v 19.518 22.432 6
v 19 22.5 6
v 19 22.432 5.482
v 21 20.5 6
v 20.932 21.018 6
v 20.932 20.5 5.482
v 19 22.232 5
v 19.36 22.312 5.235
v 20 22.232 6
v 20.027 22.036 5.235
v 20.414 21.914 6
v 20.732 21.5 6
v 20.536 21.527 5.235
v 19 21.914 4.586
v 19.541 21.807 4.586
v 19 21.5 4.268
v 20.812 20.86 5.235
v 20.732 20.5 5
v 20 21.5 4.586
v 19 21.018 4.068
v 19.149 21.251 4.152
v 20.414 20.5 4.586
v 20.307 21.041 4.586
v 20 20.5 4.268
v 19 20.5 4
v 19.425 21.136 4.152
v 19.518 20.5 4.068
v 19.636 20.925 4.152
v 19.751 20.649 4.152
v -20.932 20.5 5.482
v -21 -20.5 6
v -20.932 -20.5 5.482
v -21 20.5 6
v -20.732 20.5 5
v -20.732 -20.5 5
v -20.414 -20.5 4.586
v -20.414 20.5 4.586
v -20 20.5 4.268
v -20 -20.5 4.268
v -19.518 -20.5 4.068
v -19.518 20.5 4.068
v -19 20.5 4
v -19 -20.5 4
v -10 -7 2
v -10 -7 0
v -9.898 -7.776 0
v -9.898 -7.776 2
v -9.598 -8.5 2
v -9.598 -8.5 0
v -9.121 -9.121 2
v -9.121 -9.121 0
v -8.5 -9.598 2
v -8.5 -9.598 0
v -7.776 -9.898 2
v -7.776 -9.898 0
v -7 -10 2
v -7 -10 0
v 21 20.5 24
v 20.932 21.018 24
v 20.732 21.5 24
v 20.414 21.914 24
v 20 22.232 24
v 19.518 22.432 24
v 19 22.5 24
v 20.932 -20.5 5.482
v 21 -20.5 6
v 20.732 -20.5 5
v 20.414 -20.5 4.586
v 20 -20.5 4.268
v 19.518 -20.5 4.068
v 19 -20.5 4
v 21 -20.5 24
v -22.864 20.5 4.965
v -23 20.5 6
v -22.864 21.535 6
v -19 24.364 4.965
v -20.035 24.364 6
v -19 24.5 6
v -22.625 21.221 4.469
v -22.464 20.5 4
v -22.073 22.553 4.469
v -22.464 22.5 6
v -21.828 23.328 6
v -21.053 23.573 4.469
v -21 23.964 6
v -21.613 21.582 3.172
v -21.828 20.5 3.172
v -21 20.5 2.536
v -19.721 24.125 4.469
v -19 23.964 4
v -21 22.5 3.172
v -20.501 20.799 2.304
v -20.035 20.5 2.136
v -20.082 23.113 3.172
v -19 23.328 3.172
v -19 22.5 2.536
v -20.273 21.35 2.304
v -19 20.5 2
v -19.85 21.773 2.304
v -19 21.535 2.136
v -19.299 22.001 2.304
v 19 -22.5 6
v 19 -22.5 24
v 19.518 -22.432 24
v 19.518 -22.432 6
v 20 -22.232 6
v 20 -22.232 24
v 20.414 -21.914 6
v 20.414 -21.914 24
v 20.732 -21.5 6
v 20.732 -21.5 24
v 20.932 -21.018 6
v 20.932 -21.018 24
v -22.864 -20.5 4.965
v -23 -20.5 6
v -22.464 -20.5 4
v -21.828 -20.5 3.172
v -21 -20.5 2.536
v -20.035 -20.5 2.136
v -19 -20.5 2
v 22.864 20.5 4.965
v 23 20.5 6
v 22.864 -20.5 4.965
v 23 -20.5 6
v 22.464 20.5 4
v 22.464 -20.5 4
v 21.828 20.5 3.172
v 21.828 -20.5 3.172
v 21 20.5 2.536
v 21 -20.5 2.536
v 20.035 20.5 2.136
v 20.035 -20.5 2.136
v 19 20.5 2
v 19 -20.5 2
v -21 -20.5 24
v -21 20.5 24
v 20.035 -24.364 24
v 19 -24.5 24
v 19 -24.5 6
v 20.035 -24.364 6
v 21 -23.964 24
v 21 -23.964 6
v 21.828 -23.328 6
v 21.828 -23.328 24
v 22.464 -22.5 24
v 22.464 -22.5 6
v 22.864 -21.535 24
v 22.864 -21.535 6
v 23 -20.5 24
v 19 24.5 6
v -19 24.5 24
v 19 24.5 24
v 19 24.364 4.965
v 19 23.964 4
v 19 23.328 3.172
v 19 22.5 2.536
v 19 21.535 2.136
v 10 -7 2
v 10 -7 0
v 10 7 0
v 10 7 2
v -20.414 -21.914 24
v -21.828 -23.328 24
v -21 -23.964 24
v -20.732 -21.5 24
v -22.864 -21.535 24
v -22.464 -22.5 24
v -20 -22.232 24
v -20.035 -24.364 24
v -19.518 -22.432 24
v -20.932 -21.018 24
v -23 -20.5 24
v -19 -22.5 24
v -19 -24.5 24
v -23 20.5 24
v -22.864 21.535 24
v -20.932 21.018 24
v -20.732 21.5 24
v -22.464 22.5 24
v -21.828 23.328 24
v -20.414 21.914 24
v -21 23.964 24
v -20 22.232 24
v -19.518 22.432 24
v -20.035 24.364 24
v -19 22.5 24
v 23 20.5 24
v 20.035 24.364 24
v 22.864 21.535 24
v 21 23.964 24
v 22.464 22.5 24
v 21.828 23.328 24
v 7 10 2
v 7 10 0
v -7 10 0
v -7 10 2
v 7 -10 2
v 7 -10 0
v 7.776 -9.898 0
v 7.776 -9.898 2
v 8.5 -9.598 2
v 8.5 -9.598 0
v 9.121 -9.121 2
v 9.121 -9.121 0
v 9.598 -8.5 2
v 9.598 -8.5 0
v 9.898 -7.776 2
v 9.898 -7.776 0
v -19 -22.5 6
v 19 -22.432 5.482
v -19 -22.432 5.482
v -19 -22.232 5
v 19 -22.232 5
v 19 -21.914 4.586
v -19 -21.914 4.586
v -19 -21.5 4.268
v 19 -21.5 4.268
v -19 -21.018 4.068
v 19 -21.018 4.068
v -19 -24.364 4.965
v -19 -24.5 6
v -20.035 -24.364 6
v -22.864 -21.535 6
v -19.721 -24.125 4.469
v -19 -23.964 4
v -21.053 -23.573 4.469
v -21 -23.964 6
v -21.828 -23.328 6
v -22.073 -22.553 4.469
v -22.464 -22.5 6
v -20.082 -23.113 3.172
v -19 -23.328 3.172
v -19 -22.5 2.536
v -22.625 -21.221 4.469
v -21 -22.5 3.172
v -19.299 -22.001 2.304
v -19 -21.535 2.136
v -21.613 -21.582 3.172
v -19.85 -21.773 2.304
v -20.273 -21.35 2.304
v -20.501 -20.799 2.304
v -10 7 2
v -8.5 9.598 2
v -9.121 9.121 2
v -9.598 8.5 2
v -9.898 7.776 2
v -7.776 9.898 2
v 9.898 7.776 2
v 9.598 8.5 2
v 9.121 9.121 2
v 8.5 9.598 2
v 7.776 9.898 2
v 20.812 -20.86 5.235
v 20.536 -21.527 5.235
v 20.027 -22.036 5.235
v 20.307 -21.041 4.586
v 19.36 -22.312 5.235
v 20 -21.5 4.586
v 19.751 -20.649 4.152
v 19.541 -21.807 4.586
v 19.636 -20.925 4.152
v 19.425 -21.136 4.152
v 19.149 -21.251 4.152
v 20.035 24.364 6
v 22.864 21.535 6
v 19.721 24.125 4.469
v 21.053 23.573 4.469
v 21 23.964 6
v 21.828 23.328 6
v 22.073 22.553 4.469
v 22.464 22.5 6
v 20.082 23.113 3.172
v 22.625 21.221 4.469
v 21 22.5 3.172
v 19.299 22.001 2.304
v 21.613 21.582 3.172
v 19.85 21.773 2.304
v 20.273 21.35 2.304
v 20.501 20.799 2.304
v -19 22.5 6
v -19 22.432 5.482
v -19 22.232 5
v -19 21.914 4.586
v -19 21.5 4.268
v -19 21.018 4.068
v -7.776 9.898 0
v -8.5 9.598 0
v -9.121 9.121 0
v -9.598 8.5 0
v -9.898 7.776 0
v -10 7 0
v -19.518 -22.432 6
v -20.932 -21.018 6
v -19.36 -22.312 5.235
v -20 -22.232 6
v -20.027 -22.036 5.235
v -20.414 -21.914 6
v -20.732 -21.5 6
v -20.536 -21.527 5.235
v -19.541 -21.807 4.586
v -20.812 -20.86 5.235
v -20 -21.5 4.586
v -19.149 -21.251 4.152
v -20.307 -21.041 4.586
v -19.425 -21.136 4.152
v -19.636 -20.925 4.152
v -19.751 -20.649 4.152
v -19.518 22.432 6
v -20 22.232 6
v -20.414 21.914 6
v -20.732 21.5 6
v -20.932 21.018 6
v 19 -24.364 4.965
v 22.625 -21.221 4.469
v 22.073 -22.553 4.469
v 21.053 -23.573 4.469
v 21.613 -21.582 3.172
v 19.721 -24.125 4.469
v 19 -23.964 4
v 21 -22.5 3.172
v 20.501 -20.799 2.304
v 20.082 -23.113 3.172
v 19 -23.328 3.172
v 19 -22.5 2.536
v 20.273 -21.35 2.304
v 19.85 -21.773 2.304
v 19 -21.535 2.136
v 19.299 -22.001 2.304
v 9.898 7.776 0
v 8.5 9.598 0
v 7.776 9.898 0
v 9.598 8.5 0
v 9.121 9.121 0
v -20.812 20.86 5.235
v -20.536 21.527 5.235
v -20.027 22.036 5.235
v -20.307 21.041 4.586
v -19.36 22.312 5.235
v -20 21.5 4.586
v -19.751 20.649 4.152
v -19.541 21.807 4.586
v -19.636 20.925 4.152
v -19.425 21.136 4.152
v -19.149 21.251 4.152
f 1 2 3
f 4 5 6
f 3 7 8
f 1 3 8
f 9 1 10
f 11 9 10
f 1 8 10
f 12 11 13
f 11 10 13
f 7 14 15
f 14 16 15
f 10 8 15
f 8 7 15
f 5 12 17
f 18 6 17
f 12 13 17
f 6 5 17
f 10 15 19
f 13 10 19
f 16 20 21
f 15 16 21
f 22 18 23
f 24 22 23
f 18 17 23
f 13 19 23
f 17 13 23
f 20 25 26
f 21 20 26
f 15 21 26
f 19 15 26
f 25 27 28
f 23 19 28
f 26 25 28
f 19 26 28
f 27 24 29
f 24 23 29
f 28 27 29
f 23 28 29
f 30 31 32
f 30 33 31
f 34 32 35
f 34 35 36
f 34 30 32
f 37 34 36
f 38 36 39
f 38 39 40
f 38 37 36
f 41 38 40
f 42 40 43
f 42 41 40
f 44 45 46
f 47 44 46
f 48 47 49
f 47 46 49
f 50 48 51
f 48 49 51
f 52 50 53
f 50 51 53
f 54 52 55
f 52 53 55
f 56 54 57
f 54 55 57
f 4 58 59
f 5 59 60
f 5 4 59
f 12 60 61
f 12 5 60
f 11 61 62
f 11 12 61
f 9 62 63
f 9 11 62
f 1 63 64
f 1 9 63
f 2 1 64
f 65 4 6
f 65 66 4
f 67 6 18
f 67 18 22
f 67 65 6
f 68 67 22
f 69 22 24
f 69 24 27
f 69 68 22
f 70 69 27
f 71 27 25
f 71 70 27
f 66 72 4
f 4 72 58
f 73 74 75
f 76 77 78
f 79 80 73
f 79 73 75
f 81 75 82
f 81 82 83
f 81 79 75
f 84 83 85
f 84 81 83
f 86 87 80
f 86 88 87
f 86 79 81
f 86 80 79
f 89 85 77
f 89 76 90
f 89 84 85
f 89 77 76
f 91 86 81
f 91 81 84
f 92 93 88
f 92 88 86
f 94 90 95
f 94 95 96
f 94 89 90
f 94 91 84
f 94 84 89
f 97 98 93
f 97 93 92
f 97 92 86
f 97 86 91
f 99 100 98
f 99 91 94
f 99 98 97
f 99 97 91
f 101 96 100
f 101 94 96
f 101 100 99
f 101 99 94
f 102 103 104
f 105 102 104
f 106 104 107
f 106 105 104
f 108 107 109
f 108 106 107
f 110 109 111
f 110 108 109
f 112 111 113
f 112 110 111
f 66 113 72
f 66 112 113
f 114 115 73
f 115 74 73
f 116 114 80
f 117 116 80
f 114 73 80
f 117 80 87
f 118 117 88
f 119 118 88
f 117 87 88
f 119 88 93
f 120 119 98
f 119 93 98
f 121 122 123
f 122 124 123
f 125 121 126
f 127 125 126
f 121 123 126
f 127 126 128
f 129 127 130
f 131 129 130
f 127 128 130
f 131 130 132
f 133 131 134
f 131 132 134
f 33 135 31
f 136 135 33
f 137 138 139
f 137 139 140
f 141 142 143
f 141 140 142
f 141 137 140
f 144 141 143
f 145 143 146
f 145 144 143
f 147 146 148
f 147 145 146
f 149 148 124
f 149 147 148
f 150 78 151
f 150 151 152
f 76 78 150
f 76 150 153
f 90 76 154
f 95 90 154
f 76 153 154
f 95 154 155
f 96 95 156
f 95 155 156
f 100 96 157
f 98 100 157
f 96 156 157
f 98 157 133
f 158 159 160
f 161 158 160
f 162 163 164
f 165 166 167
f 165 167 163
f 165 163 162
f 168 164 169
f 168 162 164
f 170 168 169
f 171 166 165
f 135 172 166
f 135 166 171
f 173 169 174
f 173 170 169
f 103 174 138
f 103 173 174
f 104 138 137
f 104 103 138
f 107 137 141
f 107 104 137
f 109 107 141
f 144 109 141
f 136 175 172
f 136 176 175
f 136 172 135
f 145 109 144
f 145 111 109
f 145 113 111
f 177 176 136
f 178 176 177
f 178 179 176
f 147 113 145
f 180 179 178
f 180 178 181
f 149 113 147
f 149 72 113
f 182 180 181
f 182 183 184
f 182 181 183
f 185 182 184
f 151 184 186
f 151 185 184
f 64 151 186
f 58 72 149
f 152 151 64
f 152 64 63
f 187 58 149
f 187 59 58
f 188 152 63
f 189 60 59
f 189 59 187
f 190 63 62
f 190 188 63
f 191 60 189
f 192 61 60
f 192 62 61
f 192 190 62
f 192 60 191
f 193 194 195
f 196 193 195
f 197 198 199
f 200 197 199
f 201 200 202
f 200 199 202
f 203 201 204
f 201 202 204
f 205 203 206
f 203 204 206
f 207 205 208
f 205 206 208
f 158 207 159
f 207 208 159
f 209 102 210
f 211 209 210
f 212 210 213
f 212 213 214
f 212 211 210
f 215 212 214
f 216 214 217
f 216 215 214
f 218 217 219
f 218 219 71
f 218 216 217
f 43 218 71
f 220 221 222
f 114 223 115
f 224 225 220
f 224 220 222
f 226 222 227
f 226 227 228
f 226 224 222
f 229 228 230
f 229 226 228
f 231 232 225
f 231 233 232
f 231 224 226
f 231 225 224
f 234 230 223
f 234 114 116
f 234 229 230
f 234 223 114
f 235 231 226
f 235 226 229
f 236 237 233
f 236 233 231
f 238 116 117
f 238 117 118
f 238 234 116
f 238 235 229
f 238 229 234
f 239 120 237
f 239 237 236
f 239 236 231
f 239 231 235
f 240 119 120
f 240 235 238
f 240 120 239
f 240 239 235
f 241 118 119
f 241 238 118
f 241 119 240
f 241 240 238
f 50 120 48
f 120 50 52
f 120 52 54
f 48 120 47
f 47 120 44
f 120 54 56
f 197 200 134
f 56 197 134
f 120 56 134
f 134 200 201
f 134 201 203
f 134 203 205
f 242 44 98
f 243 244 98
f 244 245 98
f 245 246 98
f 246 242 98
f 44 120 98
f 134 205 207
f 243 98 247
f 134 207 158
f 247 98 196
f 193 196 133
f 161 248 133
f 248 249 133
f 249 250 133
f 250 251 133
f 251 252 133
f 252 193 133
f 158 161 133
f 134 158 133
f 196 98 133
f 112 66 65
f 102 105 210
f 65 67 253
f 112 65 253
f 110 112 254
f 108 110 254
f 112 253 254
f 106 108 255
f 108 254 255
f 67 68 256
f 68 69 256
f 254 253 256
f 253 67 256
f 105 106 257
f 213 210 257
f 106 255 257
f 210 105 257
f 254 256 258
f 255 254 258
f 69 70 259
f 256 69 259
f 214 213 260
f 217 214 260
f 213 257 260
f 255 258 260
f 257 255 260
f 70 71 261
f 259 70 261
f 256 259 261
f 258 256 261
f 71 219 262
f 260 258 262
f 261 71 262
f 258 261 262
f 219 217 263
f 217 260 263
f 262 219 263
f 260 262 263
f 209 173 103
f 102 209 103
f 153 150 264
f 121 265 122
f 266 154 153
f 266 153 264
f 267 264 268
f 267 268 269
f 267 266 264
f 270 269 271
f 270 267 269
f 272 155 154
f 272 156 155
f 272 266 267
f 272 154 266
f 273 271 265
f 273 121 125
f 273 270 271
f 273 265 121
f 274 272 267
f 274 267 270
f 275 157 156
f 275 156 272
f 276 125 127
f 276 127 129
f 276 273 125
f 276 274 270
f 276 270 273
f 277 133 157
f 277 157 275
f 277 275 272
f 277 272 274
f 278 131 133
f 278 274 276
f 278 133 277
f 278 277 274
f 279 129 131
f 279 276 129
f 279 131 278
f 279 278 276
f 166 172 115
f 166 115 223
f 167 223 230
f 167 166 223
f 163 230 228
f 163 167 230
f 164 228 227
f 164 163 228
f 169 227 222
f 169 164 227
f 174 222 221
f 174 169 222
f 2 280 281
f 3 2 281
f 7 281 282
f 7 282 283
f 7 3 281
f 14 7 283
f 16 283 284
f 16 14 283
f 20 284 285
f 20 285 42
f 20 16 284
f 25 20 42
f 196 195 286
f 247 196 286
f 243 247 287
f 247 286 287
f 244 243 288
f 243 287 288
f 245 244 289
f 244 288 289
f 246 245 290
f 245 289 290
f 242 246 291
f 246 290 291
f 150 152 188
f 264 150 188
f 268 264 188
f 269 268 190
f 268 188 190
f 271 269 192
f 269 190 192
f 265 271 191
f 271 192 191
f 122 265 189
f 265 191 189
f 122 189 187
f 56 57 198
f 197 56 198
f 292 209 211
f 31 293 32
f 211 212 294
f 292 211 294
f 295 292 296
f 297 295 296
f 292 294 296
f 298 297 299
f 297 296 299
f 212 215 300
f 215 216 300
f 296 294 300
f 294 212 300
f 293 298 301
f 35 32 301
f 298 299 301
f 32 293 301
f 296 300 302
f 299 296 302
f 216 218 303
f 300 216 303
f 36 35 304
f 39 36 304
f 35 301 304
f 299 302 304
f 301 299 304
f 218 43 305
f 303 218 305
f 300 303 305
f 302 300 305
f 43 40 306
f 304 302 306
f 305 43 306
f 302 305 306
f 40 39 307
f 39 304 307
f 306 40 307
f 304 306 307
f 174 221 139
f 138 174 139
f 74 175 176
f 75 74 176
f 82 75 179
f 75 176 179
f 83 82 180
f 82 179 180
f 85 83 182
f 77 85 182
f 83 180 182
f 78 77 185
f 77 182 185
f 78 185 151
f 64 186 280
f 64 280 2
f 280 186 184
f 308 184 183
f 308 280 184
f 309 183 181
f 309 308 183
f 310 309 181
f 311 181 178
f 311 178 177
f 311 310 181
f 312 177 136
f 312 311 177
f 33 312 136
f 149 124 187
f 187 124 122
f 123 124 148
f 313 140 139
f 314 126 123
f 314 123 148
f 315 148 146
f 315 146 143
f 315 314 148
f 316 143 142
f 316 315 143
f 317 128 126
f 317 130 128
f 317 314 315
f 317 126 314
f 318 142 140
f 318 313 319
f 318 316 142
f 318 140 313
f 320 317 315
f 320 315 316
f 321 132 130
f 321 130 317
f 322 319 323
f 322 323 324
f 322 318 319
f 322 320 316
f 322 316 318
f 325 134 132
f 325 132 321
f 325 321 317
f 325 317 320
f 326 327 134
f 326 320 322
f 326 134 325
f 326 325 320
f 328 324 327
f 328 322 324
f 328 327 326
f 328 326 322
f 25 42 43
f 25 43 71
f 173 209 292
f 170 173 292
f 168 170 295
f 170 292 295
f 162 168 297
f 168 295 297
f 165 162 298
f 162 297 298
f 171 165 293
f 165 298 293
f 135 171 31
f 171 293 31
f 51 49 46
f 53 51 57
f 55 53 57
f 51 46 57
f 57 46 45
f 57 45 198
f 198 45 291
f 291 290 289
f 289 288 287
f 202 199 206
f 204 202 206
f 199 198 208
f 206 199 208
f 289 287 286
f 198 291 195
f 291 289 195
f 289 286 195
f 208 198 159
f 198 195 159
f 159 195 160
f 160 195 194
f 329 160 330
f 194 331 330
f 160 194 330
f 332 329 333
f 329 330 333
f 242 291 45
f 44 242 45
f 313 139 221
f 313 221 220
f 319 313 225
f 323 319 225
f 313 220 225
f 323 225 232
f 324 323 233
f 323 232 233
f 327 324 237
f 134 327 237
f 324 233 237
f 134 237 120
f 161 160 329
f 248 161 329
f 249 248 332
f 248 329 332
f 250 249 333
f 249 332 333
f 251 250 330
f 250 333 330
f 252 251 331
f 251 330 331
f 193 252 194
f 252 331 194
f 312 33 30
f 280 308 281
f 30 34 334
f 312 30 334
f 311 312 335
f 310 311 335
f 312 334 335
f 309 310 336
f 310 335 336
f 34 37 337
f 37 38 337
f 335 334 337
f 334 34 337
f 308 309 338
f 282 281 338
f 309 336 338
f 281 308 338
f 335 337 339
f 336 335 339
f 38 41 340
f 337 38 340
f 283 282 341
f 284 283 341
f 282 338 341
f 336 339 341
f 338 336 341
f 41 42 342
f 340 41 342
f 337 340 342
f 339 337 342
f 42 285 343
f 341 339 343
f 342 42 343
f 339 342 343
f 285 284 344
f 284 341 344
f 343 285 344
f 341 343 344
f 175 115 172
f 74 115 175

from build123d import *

# Parameters (mm, degrees)
F1_DEPTH = 2
F2_W     = 46
F2_H     = 49
F3_DEPTH = 22
F4_W     = 42
F4_H     = 45
F5_DEPTH = 20
F6_R     = 4
F7_R     = 2
F8_R     = 2
F9_R     = 4


with BuildPart() as f1:
    # F0 (on Top) → F1 (new body)
    with BuildSketch(Plane.XY):
        with BuildLine():
            Line((7, 10), (-7, 10))
            ThreePointArc((-7, 10), (-9.1213203436, 9.1213203436), (-10, 7))
            Line((-10, 7), (-10, -7))
            ThreePointArc((-10, -7), (-9.1213203436, -9.1213203436), (-7, -10))
            Line((-7, -10), (7, -10))
            ThreePointArc((7, -10), (9.1213203436, -9.1213203436), (10, -7))
            Line((10, -7), (10, 7))
            ThreePointArc((10, 7), (9.1213203436, 9.1213203436), (7, 10))
        make_face()
    extrude(amount=F1_DEPTH)

    # F2 (on face) → F3 (join)
    with BuildSketch(Plane.XY.offset(2)):
        Rectangle(F2_W, F2_H)
        with BuildLine():
            Line((-7, 10), (7, 10))
            ThreePointArc((7, 10), (9.1213203436, 9.1213203436), (10, 7))
            Line((10, 7), (10, -7))
            ThreePointArc((10, -7), (9.1213203436, -9.1213203436), (7, -10))
            Line((7, -10), (-7, -10))
            ThreePointArc((-7, -10), (-9.1213203436, -9.1213203436), (-10, -7))
            Line((-10, -7), (-10, 7))
            ThreePointArc((-10, 7), (-9.1213203436, 9.1213203436), (-7, 10))
        make_face(mode=Mode.SUBTRACT)
        with BuildLine():
            ThreePointArc((10, 7), (9.1213203436, 9.1213203436), (7, 10))
            Line((7, 10), (-7, 10))
            ThreePointArc((-7, 10), (-9.1213203436, 9.1213203436), (-10, 7))
            Line((-10, 7), (-10, -7))
            ThreePointArc((-10, -7), (-9.1213203436, -9.1213203436), (-7, -10))
            Line((-7, -10), (7, -10))
            ThreePointArc((7, -10), (9.1213203436, -9.1213203436), (10, -7))
            Line((10, -7), (10, 7))
        make_face()
    extrude(amount=F3_DEPTH)

    # F4 (on face) → F5 (cut)
    with BuildSketch(Plane.XY.offset(24)):
        Rectangle(F4_W, F4_H)
    extrude(amount=-F5_DEPTH, mode=Mode.SUBTRACT)

    # F6
    f6_edges = [f1.edges().sort_by_distance(p)[0] for p in [
        (-23, 24.5, 13),
        (23, 24.5, 13),
        (23, -24.5, 13),
        (-23, -24.5, 13),
    ]]
    fillet(f6_edges, radius=F6_R)

    # F7
    f7_edges = [f1.edges().sort_by_distance(p)[0] for p in [
        (21, 22.5, 14),
        (21, -22.5, 14),
        (-21, -22.5, 14),
        (-21, 22.5, 14),
    ]]
    fillet(f7_edges, radius=F7_R)

    # F8
    f8_edges = [f1.edges().sort_by_distance(p)[0] for p in [
        (0, 22.5, 4),
        (20.414214, 21.914214, 4),
        (-20.414214, 21.914214, 4),
        (21, 0, 4),
        (-21, 0, 4),
        (20.414214, -21.914214, 4),
        (-20.414214, -21.914214, 4),
        (0, -22.5, 4),
    ]]
    fillet(f8_edges, radius=F8_R)

    # F9
    f9_edges = [f1.edges().sort_by_distance(p)[0] for p in [
        (0, 24.5, 2),
        (-21.828427, 23.328427, 2),
        (-23, 0, 2),
        (-21.828427, -23.328427, 2),
        (0, -24.5, 2),
        (21.828427, -23.328427, 2),
        (23, 0, 2),
        (21.828427, 23.328427, 2),
    ]]
    fillet(f9_edges, radius=F9_R)


solid = f1.part
